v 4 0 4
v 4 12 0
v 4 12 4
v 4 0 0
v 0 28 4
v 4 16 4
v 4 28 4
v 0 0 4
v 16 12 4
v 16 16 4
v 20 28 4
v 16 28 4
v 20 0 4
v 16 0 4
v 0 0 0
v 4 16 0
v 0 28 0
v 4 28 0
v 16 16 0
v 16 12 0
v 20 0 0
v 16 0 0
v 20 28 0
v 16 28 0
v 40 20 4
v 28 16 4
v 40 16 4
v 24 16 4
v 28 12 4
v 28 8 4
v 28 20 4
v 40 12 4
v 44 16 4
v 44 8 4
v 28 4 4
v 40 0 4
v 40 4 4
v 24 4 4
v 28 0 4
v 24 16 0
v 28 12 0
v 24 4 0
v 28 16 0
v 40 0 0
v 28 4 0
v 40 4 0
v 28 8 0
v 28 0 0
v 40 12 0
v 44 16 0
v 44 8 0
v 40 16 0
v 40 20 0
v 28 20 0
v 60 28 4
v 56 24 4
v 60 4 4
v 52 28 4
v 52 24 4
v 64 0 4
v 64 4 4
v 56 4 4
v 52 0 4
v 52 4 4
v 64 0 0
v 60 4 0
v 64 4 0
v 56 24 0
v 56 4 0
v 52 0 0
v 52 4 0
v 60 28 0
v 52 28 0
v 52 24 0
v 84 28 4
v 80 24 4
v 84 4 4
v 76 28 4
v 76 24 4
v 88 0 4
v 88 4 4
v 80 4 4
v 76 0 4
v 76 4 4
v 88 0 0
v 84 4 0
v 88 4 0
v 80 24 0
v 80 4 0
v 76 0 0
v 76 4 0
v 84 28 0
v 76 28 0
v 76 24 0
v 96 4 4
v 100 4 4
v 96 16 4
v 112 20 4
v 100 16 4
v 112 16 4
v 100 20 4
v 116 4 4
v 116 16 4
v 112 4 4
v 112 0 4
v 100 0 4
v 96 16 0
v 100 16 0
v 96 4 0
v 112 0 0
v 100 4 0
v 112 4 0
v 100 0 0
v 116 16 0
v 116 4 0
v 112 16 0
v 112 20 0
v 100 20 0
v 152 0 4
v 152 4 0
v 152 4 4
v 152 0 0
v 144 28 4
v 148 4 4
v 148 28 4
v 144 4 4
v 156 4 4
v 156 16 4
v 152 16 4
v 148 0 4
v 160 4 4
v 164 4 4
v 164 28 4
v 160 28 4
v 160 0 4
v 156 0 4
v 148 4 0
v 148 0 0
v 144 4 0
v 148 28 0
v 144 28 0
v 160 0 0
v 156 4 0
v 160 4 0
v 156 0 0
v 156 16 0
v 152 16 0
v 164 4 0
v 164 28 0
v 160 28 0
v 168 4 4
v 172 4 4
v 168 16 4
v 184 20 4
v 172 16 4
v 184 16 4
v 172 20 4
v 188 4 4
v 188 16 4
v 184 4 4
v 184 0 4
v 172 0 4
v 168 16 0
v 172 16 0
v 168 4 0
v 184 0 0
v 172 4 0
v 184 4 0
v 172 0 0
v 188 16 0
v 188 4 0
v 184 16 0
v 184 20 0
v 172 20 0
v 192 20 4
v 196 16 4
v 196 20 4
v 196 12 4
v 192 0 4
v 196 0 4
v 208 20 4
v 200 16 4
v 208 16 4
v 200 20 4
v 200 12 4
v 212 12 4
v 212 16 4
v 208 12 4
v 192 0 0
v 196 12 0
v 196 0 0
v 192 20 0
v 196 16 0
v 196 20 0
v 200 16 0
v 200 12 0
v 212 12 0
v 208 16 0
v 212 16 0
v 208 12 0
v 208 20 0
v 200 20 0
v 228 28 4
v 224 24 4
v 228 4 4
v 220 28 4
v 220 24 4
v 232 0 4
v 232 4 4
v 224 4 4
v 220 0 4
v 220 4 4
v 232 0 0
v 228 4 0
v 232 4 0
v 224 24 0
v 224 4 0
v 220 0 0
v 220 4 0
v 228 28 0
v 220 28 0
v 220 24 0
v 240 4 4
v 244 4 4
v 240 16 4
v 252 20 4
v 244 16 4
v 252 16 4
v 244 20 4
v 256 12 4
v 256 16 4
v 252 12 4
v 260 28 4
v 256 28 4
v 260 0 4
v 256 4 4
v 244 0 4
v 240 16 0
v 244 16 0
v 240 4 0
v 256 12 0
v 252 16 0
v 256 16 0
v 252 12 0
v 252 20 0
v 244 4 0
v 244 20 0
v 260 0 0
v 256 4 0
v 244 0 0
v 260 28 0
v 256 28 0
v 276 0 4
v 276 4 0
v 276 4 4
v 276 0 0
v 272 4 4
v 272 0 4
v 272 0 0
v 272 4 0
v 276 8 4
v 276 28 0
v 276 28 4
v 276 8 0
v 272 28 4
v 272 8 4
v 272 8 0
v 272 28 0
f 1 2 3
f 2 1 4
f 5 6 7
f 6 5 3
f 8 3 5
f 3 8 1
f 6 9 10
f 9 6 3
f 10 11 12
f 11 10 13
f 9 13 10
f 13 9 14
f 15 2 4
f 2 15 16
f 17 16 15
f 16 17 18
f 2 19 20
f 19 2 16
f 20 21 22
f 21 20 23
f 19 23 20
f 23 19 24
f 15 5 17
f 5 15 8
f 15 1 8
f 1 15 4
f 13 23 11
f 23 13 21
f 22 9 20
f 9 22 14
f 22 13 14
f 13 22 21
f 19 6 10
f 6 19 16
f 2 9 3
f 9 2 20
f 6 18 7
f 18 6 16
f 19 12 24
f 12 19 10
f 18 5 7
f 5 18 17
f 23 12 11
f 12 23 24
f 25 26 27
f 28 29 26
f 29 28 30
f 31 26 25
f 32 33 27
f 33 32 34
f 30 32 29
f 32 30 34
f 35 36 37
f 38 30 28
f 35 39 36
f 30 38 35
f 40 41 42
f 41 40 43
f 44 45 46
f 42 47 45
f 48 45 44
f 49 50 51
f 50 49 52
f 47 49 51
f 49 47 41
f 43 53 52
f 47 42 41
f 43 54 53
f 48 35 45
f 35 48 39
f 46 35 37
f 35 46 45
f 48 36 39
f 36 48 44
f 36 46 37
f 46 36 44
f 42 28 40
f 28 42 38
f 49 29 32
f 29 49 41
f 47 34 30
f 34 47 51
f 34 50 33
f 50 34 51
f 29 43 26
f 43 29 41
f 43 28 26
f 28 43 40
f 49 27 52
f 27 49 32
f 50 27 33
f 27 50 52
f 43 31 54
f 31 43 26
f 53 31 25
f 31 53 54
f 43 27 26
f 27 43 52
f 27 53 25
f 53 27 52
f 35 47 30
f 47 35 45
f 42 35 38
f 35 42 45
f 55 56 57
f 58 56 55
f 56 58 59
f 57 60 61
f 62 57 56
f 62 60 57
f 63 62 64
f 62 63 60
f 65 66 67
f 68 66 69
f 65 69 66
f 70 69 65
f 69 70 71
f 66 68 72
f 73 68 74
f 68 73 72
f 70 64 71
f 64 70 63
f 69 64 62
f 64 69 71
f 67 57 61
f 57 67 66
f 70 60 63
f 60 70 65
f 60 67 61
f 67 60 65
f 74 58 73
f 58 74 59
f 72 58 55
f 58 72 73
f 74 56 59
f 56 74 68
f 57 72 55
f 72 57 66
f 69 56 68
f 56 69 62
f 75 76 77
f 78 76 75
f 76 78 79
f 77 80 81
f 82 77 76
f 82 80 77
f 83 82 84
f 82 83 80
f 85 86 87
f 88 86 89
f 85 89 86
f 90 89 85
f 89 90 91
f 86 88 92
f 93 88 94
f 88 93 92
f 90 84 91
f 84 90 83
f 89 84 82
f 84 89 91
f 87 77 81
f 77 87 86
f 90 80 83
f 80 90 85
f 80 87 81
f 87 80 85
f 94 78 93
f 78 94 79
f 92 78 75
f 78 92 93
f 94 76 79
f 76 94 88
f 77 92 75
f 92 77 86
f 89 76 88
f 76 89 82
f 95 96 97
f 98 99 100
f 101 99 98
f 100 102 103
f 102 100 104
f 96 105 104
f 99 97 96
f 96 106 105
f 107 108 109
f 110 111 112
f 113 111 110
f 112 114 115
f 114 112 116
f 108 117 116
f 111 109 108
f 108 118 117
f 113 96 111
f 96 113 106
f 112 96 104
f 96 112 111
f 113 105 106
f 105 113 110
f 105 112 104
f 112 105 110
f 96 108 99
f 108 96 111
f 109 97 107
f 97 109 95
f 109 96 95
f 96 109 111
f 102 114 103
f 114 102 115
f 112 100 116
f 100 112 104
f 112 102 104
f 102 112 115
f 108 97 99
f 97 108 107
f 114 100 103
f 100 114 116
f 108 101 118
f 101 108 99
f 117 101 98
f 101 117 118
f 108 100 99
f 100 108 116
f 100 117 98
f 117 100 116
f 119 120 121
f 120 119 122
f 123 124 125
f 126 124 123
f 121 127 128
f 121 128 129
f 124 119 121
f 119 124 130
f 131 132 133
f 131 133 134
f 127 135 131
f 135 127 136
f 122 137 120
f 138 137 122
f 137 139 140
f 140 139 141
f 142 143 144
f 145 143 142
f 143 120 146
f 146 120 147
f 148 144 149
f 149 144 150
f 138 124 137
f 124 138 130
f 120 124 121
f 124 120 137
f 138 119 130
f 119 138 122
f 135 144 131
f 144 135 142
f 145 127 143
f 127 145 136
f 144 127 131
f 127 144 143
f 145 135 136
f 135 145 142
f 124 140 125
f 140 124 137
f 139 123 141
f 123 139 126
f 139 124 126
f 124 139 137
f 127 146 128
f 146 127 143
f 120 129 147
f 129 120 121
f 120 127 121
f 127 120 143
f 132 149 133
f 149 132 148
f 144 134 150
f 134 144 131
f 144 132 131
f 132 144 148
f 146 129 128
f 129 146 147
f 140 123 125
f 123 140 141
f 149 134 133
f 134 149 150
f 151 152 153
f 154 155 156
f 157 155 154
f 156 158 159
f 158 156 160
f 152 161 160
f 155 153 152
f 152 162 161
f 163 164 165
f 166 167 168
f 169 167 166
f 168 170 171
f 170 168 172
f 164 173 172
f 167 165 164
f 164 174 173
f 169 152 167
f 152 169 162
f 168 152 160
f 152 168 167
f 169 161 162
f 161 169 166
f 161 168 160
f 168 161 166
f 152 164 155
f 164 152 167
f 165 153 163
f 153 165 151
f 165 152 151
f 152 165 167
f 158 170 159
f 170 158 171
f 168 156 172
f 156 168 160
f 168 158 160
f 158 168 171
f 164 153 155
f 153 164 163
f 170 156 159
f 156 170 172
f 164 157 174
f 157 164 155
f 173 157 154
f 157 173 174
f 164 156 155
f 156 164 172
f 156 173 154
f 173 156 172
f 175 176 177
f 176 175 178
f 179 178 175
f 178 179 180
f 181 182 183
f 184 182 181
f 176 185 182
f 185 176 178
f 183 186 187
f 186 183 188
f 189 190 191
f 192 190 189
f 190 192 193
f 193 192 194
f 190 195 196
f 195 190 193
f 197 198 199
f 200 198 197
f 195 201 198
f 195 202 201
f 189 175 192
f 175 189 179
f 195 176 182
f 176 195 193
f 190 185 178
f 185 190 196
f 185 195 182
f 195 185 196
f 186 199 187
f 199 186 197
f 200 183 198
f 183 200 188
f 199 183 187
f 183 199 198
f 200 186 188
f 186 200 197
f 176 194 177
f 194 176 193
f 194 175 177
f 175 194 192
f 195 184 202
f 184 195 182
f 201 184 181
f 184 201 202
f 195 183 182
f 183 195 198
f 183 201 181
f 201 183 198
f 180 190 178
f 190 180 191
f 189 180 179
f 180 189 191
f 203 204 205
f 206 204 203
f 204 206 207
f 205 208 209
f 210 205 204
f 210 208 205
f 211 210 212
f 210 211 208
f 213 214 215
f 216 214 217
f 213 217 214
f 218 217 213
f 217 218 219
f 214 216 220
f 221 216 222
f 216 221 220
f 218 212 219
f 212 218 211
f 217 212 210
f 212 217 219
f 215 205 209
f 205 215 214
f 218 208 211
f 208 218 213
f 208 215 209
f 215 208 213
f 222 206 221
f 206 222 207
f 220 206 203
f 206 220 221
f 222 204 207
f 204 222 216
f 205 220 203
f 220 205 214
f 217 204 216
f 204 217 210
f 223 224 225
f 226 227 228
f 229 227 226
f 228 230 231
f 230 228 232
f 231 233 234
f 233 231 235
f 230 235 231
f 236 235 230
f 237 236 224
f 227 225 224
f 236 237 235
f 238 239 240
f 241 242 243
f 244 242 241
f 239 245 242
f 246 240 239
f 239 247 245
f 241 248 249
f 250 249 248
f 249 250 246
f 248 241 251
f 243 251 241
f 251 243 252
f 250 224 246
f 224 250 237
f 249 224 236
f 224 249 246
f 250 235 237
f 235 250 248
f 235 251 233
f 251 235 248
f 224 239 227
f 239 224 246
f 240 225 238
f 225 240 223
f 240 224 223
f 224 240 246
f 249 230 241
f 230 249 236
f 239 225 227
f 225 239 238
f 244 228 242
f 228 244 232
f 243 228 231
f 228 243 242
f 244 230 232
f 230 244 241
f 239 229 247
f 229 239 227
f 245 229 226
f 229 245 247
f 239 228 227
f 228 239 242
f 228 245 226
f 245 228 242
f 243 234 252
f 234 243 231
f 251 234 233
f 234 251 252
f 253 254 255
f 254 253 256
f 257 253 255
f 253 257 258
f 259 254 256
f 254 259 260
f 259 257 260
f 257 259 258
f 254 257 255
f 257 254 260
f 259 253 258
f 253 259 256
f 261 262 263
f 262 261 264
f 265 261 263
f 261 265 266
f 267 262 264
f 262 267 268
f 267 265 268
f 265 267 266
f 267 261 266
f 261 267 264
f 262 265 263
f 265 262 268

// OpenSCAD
/*

OpenSCAD 3D Text Generator

http://www.thingiverse.com/thing:59817/

CC BY-SA Phil Greenland.
https://creativecommons.org/licenses/by-sa/3.0/

*/

//Draw text
scale([4,4,4]) drawtext("Hello World!");

//Draw character set
//scale([2,2,2]) drawtext(" !\"#$%&'()*+,-./0123456789:;<=>?@ABCDEFGHIJKLMNOPQRSTUVWXYZ[\\]^_`abcdefghijklmnopqrstuvwxyz{|}");

module drawtext(text) {
	//Characters
	chars = " !\"#$%&'()*+,-./0123456789:;<=>?@ABCDEFGHIJKLMNOPQRSTUVWXYZ[\\]^_`abcdefghijklmnopqrstuvwxyz{|}";

	//Chracter table defining 5x7 characters
	//Adapted from: http://www.geocities.com/dinceraydin/djlcdsim/chartable.js
	char_table = [ [ 0, 0, 0, 0, 0, 0, 0],
                  [ 4, 0, 4, 4, 4, 4, 4],
                  [ 0, 0, 0, 0,10,10,10],
                  [10,10,31,10,31,10,10],
                  [ 4,30, 5,14,20,15, 4],
                  [ 3,19, 8, 4, 2,25,24],
                  [13,18,21, 8,20,18,12],
                  [ 0, 0, 0, 0, 8, 4,12],
                  [ 2, 4, 8, 8, 8, 4, 2],
                  [ 8, 4, 2, 2, 2, 4, 8],
                  [ 0, 4,21,14,21, 4, 0],
                  [ 0, 4, 4,31, 4, 4, 0],
                  [ 8, 4,12, 0, 0, 0, 0],
                  [ 0, 0, 0,31, 0, 0, 0],
                  [12,12, 0, 0, 0, 0, 0],
                  [ 0,16, 8, 4, 2, 1, 0],
                  [14,17,25,21,19,17,14],
                  [14, 4, 4, 4, 4,12, 4],
                  [31, 8, 4, 2, 1,17,14],
                  [14,17, 1, 2, 4, 2,31],
                  [ 2, 2,31,18,10, 6, 2],
                  [14,17, 1, 1,30,16,31],
                  [14,17,17,30,16, 8, 6],
                  [ 8, 8, 8, 4, 2, 1,31],
                  [14,17,17,14,17,17,14],
                  [12, 2, 1,15,17,17,14],
                  [ 0,12,12, 0,12,12, 0],
                  [ 8, 4,12, 0,12,12, 0],
                  [ 2, 4, 8,16, 8, 4, 2],
                  [ 0, 0,31, 0,31, 0, 0],
                  [16, 8, 4, 2, 4, 8,16],
                  [ 4, 0, 4, 2, 1,17,14],
                  [14,21,21,13, 1,17,14],
                  [17,17,31,17,17,17,14],
                  [30,17,17,30,17,17,30],
                  [14,17,16,16,16,17,14],
                  [30,17,17,17,17,17,30],
                  [31,16,16,30,16,16,31],
                  [16,16,16,30,16,16,31],
                  [15,17,17,23,16,17,14],
                  [17,17,17,31,17,17,17],
                  [14, 4, 4, 4, 4, 4,14],
                  [12,18, 2, 2, 2, 2, 7],
                  [17,18,20,24,20,18,17],
                  [31,16,16,16,16,16,16],
                  [17,17,17,21,21,27,17],
                  [17,17,19,21,25,17,17],
                  [14,17,17,17,17,17,14],
                  [16,16,16,30,17,17,30],
                  [13,18,21,17,17,17,14],
                  [17,18,20,30,17,17,30],
                  [30, 1, 1,14,16,16,15],
                  [ 4, 4, 4, 4, 4, 4,31],
                  [14,17,17,17,17,17,17],
                  [ 4,10,17,17,17,17,17],
                  [10,21,21,21,17,17,17],
                  [17,17,10, 4,10,17,17],
                  [ 4, 4, 4,10,17,17,17],
                  [31,16, 8, 4, 2, 1,31],
                  [14, 8, 8, 8, 8, 8,14],
                  [ 0, 1, 2, 4, 8,16, 0],
                  [14, 2, 2, 2, 2, 2,14],
                  [ 0, 0, 0, 0,17,10, 4],
                  [31, 0, 0, 0, 0, 0, 0],
                  [ 0, 0, 0, 0, 2, 4, 8],
                  [15,17,15, 1,14, 0, 0],
                  [30,17,17,25,22,16,16],
                  [14,17,16,16,14, 0, 0],
                  [15,17,17,19,13, 1, 1],
                  [14,16,31,17,14, 0, 0],
                  [ 8, 8, 8,28, 8, 9, 6],
                  [14, 1,15,17,15, 0, 0],
                  [17,17,17,25,22,16,16],
                  [14, 4, 4, 4,12, 0, 4],
                  [12,18, 2, 2, 2, 6, 2],
                  [18,20,24,20,18,16,16],
                  [14, 4, 4, 4, 4, 4,12],
                  [17,17,21,21,26, 0, 0],
                  [17,17,17,25,22, 0, 0],
                  [14,17,17,17,14, 0, 0],
                  [16,16,30,17,30, 0, 0],
                  [ 1, 1,15,19,13, 0, 0],
                  [16,16,16,25,22, 0, 0],
                  [30, 1,14,16,15, 0, 0],
                  [ 6, 9, 8, 8,28, 8, 8],
                  [13,19,17,17,17, 0, 0],
                  [ 4,10,17,17,17, 0, 0],
                  [10,21,21,17,17, 0, 0],
                  [17,10, 4,10,17, 0, 0],
                  [14, 1,15,17,17, 0, 0],
                  [31, 8, 4, 2,31, 0, 0],
                  [ 2, 4, 4, 8, 4, 4, 2],
                  [ 4, 4, 4, 4, 4, 4, 4],
                  [ 8, 4, 4, 2, 4, 4, 8] ];

	//Binary decode table
	dec_table = [ "00000", "00001", "00010", "00011", "00100", "00101",
  	            "00110", "00111", "01000", "01001", "01010", "01011",
  	            "01100", "01101", "01110", "01111", "10000", "10001",
  	            "10010", "10011", "10100", "10101", "10110", "10111",
	            "11000", "11001", "11010", "11011", "11100", "11101",
	            "11110", "11111" ];

	//Process string one character at a time
	for(itext = [0:len(text)-1]) {
		//Convert character to index
		assign(ichar = search(text[itext],chars,1)[0]) {
			//Decode character - rows
			for(irow = [0:6]) {
				assign(val = dec_table[char_table[ichar][irow]]) {
					//Decode character - cols
					for(icol = [0:4]) {
						assign(bit = search(val[icol],"01",1)[0]) {
							if(bit) {
								//Output cube
								translate([icol + (6*itext), irow, 0])
									cube([1.0001,1.0001,1]);
							}
						}
					}
				}
			}
		}
	}
}
